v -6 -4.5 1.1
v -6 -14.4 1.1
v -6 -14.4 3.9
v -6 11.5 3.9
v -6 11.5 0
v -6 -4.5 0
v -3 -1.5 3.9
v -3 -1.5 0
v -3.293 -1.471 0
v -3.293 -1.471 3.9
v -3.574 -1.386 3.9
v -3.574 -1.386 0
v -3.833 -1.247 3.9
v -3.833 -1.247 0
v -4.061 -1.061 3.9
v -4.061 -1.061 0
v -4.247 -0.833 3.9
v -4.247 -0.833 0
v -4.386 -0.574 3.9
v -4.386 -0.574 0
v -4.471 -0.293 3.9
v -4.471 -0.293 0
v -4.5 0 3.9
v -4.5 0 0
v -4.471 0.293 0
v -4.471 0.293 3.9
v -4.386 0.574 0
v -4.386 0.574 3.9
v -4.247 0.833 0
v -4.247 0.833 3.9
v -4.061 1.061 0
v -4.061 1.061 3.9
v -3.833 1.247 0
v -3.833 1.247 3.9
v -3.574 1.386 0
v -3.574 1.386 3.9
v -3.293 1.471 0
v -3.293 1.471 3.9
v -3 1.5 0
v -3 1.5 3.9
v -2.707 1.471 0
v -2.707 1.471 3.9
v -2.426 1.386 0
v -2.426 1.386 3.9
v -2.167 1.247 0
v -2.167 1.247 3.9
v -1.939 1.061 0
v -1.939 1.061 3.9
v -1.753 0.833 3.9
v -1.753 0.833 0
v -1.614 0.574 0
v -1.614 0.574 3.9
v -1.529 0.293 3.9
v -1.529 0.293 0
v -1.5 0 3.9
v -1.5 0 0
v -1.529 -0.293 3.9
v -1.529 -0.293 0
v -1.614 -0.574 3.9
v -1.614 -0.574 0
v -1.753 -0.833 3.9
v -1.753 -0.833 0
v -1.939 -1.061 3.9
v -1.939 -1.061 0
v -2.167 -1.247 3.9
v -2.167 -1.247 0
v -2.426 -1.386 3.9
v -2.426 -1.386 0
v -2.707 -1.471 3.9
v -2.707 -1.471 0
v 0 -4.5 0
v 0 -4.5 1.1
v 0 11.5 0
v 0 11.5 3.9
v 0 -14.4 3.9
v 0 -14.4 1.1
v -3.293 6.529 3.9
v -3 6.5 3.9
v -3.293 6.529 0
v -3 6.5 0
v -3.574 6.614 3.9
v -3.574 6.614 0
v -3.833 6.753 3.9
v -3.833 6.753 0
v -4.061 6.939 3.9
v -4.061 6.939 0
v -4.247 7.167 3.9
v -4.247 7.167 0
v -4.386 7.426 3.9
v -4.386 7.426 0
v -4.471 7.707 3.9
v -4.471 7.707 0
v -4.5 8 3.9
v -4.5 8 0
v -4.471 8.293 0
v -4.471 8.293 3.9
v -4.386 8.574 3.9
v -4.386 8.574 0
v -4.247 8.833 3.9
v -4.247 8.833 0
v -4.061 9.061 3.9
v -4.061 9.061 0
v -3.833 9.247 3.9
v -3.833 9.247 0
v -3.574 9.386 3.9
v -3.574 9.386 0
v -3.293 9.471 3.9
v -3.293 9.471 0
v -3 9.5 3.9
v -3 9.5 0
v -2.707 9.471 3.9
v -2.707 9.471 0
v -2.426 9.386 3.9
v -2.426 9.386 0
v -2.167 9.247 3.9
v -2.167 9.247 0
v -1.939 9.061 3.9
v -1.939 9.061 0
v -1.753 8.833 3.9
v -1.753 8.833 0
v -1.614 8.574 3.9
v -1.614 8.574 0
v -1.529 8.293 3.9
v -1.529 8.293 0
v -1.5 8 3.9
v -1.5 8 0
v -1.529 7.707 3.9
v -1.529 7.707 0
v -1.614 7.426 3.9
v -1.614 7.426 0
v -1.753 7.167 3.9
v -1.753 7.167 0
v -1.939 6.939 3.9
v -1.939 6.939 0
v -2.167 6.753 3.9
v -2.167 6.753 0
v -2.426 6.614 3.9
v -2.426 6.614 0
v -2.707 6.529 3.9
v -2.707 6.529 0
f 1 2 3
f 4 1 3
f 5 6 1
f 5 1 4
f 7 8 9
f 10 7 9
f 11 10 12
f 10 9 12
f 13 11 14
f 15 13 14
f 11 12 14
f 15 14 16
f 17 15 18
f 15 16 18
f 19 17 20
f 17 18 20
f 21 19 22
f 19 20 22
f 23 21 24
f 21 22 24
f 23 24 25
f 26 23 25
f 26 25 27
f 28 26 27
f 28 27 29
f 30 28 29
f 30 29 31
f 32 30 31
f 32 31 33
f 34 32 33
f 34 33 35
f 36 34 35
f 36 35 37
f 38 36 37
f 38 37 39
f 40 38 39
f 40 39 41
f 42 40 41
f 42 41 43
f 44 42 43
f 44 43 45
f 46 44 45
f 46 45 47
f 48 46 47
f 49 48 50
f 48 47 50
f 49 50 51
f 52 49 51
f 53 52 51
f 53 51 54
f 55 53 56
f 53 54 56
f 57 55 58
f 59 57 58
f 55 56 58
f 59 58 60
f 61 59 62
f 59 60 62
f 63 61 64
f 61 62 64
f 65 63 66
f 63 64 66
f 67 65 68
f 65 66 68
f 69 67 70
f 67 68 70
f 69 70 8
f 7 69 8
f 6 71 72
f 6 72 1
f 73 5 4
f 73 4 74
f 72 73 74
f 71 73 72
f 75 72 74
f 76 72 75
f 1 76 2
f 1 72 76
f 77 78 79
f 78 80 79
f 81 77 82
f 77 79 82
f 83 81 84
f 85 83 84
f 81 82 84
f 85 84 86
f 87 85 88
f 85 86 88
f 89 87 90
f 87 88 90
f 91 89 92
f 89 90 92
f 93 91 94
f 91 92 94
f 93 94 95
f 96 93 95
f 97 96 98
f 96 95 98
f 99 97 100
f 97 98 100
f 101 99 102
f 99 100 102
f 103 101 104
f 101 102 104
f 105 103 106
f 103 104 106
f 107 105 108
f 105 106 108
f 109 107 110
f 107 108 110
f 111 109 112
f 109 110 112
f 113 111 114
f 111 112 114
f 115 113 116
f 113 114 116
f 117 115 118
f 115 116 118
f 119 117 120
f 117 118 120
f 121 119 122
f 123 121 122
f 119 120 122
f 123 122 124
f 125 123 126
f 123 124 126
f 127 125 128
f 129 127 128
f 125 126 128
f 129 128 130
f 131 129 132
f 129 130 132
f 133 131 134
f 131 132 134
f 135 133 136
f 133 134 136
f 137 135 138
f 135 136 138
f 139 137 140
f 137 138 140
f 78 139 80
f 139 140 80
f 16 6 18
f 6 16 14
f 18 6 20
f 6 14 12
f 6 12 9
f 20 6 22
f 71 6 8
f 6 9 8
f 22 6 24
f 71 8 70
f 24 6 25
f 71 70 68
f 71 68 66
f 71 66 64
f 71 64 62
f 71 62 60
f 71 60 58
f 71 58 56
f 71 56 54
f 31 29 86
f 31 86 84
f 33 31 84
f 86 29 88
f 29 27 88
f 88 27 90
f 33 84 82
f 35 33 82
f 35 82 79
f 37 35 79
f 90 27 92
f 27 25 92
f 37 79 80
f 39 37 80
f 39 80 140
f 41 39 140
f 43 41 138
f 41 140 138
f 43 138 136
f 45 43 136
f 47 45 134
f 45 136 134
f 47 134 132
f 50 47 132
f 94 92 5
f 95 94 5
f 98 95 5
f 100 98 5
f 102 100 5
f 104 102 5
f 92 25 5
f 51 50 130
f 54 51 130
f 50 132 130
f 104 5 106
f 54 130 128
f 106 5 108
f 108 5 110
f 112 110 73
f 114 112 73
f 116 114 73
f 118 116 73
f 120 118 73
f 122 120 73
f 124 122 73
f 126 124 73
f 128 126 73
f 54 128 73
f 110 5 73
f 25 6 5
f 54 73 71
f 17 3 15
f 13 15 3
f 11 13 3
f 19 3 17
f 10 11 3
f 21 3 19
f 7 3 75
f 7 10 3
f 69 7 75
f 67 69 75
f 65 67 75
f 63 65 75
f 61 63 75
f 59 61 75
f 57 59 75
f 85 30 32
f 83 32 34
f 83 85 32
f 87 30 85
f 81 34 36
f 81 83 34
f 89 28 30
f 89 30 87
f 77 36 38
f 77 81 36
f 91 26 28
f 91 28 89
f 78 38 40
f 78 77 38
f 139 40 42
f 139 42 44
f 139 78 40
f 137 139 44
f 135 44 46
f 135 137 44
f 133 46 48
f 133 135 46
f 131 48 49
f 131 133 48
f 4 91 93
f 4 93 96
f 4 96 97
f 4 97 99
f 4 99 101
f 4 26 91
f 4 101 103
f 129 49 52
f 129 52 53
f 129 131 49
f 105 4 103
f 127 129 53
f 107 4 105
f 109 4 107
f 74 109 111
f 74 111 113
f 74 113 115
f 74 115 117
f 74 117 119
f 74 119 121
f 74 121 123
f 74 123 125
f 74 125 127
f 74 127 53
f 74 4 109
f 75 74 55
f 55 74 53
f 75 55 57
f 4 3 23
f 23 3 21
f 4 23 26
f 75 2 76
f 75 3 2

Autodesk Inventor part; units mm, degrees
ref_plane "YZ Plane" through (0, 0, 0) normal (1, 0, 0) x (0, 1, 0)
ref_plane "XZ Plane" through (0, 0, 0) normal (0, 1, 0) x (-1, 0, 0)
ref_plane "XY Plane" through (0, 0, 0) normal (0, 0, 1) x (1, 0, 0)
sketch "Sketch1" plane through (0, 0, 0) normal (0, 0, 1) x (1, 0, 0)
  line L0 (0, -4.5) -> (-6, -4.5)
  line L1 (-6, -4.5) -> (-6, 11.5)
  line L2 (-6, 11.5) -> (0, 11.5)
  line L3 (0, 11.5) -> (0, -4.5)
  point P0 (0, 0)
  dimension "d0" = 6
  dimension "d1" = 16
  dimension "d17" = 0
  dimension "d18" = 11.5
extrude "Extrusion1" add sketch "Sketch1" along normal blind 3.9
sketch "Sketch2" plane through (-6, -4.5, 0) normal (0, -1, 0) x (1, 0, 0)
  point P0 (6, 0)
sketch "Sketch3" plane through (-6, -4.5, 0) normal (0, -1, 0) x (1, 0, 0)
  line L0 (0, 3.9) -> (6, 3.9) projected
  line L1 (6, 0) -> (6, 3.9) projected
  line L2 (0, 3.9) -> (6, 3.9)
  line L3 (6, 3.9) -> (6, 1.1)
  line L4 (6, 1.1) -> (0, 1.1)
  line L5 (0, 1.1) -> (0, 3.9)
  dimension "d4" = 2.8
extrude "Extrusion2" add sketch "Sketch3" along normal blind 9.9
sketch "Sketch4" plane through (0, 0, 3.9) normal (0, 0, 1) x (1, 0, 0)
  point P0 (0, 0)
  point P1 (-3, 8)
  point P2 (-3, 0)
hole "Hole1" at (-3, 8, 3.9) at (-3, 0, 3.9) direction (0, 0, -1) diameter 3 end through all
properties part number "GT2 belt clamp" material "Aluminum 6061"
